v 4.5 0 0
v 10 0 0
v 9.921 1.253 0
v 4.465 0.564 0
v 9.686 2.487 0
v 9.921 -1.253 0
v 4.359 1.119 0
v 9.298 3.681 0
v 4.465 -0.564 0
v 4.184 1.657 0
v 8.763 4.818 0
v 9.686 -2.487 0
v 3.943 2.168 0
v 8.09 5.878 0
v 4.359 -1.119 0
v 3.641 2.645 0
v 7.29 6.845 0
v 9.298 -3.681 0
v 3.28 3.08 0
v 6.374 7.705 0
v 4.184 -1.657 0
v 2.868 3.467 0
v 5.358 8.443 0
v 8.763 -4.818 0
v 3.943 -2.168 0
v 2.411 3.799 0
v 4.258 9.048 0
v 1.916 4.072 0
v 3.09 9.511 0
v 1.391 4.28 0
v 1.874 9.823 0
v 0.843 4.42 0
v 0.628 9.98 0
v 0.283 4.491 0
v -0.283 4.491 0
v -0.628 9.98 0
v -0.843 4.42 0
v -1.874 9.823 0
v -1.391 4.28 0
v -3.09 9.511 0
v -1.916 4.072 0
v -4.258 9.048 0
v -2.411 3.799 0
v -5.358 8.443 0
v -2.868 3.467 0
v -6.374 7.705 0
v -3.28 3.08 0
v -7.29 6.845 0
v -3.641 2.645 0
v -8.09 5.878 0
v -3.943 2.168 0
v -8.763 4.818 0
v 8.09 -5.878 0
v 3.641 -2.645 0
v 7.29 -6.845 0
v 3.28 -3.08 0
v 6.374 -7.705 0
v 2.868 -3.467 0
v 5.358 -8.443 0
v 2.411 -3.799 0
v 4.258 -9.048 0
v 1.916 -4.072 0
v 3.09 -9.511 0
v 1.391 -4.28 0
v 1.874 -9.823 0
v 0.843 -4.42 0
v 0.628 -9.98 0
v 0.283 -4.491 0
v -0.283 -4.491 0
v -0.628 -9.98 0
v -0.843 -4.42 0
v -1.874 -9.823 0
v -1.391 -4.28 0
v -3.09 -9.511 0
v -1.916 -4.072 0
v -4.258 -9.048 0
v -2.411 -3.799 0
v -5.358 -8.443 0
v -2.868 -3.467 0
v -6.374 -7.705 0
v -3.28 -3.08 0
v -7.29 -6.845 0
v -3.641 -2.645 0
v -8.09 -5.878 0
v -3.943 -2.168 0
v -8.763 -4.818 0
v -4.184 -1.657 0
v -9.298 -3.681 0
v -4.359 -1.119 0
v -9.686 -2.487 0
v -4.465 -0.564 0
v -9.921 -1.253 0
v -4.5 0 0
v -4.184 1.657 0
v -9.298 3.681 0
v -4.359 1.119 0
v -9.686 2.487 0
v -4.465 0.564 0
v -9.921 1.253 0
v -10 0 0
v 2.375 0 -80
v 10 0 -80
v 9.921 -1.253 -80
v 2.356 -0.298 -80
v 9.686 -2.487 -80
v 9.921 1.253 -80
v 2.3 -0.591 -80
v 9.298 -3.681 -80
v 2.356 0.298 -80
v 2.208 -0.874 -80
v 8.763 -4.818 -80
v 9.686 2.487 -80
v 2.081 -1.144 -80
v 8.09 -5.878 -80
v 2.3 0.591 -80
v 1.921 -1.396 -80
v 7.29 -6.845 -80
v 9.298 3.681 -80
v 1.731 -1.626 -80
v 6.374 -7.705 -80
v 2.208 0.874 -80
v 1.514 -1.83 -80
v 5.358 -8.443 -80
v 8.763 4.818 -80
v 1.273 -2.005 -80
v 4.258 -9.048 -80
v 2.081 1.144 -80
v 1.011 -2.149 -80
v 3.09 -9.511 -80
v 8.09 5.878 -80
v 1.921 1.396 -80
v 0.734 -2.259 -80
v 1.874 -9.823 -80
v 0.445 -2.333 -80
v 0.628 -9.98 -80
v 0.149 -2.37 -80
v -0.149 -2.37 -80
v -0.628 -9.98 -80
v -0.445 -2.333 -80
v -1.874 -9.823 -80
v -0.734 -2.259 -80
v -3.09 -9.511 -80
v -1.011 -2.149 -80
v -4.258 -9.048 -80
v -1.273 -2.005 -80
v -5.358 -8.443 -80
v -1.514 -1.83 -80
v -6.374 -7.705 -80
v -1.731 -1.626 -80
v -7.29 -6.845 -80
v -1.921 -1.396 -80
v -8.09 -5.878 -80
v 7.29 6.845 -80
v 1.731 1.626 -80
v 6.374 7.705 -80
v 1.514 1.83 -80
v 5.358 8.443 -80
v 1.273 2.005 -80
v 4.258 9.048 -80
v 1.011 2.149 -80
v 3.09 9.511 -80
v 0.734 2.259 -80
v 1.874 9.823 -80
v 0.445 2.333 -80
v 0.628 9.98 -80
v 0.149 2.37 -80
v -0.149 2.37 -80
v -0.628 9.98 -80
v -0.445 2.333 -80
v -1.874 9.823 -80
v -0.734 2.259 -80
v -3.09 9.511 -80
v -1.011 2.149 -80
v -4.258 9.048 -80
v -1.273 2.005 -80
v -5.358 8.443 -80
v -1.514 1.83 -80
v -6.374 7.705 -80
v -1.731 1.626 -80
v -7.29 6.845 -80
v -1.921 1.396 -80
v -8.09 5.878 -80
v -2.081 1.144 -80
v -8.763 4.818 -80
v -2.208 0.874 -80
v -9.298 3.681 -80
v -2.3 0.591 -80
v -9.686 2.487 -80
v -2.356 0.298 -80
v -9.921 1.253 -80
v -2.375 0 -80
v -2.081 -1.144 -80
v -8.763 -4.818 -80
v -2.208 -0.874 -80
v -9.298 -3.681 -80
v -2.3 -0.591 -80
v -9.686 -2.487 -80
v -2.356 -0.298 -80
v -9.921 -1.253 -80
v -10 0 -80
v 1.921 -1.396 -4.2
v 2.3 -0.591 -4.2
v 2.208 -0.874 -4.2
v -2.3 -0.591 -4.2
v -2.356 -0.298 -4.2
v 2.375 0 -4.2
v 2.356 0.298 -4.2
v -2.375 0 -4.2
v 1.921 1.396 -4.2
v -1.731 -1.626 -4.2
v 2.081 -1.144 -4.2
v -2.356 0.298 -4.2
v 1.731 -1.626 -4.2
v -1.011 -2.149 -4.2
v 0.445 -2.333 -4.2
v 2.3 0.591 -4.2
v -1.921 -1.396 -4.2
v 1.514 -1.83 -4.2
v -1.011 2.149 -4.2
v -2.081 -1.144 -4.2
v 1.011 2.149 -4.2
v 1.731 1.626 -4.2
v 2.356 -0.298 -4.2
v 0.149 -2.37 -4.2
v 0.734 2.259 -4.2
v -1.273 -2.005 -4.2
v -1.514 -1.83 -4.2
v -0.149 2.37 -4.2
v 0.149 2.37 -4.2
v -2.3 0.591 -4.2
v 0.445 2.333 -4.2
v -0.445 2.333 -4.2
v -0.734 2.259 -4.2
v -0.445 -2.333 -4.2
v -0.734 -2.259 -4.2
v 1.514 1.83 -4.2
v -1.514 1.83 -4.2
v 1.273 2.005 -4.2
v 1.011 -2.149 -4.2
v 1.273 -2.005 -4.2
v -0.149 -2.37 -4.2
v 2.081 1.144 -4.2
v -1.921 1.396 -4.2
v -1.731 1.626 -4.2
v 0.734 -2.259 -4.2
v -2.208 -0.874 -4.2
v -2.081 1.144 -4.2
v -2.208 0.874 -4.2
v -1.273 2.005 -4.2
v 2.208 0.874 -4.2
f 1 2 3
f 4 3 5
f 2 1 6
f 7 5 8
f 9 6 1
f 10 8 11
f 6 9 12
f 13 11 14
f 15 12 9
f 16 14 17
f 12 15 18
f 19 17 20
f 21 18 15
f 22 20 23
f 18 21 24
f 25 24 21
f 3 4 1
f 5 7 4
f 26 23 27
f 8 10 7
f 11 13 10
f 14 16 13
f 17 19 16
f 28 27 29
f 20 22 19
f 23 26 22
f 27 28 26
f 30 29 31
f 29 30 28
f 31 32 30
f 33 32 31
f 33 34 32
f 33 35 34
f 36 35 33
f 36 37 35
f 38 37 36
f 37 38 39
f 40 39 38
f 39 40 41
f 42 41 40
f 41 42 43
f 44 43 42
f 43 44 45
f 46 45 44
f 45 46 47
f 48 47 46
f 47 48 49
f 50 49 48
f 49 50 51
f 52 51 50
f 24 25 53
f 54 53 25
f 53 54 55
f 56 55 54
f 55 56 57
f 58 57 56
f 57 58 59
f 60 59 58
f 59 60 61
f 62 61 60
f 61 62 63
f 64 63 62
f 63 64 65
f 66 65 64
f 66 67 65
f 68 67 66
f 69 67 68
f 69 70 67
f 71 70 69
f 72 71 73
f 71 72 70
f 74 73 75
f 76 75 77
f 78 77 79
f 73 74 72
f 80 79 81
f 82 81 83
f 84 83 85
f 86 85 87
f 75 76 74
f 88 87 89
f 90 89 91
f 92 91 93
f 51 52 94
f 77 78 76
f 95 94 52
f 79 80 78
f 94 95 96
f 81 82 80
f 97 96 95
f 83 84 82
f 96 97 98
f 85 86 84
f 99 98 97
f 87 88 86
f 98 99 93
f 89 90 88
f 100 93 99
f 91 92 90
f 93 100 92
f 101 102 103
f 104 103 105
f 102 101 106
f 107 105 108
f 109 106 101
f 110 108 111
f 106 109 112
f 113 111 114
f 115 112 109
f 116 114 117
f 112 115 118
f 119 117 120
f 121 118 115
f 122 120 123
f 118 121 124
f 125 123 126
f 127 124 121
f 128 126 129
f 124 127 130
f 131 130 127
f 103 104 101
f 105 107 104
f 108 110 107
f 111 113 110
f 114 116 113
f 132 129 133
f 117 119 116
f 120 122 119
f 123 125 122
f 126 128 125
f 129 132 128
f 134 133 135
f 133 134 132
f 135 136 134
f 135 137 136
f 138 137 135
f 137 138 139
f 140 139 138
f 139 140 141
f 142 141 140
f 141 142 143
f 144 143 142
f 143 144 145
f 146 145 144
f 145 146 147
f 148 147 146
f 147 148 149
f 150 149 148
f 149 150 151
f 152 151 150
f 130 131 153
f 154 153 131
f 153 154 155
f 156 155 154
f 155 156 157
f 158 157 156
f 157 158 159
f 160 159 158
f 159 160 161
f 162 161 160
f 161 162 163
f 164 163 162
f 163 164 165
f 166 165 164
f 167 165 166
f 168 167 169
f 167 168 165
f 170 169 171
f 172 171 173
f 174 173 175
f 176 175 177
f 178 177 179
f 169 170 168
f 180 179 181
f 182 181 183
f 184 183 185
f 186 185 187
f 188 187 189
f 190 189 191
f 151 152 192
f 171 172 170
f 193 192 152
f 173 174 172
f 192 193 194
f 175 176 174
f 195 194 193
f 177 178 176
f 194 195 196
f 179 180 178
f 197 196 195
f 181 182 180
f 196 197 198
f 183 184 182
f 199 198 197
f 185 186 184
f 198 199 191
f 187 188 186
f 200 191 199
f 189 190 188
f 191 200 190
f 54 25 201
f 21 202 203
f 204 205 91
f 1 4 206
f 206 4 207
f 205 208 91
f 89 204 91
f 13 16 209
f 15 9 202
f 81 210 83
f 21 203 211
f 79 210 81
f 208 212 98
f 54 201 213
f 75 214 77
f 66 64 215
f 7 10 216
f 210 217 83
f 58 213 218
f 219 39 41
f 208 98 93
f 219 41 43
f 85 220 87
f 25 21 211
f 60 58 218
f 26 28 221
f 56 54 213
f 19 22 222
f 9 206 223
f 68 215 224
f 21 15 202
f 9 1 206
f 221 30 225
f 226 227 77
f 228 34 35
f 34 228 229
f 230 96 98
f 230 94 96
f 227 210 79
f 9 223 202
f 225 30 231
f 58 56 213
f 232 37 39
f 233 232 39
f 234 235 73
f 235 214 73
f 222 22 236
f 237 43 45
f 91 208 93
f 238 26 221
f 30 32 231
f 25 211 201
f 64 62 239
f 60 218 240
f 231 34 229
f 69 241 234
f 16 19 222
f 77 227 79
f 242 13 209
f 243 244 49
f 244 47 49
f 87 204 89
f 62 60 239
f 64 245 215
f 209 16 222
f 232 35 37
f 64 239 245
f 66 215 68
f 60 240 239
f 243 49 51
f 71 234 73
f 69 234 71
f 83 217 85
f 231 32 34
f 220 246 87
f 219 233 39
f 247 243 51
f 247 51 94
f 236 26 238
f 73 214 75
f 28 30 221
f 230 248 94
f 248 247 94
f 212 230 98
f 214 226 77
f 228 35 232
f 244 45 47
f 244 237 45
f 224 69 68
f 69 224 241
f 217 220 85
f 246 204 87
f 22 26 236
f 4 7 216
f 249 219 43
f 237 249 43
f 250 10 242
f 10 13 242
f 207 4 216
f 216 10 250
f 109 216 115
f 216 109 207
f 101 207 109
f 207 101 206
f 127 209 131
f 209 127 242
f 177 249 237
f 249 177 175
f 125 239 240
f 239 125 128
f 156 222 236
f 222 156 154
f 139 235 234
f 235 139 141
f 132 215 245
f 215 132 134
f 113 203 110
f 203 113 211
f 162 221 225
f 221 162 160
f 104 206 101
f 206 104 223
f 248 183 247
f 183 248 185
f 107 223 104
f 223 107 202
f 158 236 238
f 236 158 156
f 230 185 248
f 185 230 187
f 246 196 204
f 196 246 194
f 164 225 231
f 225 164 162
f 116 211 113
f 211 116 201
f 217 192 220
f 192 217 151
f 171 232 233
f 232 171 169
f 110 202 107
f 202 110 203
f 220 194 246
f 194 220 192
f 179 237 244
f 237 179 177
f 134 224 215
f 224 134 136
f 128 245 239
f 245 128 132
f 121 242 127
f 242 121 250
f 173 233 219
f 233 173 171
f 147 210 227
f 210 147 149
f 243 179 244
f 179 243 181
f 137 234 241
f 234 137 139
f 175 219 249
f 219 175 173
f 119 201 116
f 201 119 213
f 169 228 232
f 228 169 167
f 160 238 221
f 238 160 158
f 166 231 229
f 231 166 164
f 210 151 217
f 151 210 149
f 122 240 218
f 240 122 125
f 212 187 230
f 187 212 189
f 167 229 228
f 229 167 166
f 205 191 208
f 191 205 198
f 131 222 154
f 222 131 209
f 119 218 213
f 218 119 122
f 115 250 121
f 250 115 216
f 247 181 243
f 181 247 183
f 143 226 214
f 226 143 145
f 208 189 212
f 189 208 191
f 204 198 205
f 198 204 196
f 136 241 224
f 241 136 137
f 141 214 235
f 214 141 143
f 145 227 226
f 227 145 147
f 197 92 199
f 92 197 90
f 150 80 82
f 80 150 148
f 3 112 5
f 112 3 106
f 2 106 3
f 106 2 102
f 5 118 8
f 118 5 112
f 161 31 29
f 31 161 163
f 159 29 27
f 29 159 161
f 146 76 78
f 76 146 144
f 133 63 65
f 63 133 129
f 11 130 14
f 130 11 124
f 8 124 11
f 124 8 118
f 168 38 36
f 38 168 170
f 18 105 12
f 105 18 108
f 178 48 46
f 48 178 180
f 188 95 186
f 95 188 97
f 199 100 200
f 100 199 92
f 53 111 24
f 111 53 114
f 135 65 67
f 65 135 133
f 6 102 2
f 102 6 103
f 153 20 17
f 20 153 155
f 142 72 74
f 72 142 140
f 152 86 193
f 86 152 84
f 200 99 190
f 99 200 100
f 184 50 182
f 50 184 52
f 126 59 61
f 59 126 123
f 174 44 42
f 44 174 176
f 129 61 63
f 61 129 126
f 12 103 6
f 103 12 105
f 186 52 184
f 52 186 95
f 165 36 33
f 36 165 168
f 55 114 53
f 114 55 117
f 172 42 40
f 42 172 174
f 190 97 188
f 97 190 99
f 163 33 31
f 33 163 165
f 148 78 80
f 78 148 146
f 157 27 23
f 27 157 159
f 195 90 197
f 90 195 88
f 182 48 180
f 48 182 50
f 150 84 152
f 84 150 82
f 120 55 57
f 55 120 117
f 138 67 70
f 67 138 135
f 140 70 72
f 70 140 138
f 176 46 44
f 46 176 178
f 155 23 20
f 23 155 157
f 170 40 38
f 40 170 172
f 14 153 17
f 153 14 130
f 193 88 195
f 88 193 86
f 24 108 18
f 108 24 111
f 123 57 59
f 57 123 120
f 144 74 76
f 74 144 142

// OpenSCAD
$fn = 50;


difference() {
	union() {
		translate(v = [0, 0, -80.0000000000]) {
			cylinder(h = 80, r = 10.0000000000);
		}
		cylinder(h = 0, r = 13.0000000000);
	}
	union() {
		translate(v = [0, 0, 0]) {
			rotate(a = [0, 0, 0]) {
				difference() {
					union() {
						#translate(v = [0, 0, -80.0000000000]) {
							cylinder(h = 80, r = 2.2500000000);
						}
						#translate(v = [0, 0, -4.2000000000]) {
							cylinder(h = 4.2000000000, r1 = 2.3750000000, r2 = 4.5000000000);
						}
						#translate(v = [0, 0, -80.0000000000]) {
							cylinder(h = 80, r = 2.3750000000);
						}
						#translate(v = [0, 0, -80.0000000000]) {
							cylinder(h = 80, r = 2.2500000000);
						}
					}
					union();
				}
			}
		}
	}
}
